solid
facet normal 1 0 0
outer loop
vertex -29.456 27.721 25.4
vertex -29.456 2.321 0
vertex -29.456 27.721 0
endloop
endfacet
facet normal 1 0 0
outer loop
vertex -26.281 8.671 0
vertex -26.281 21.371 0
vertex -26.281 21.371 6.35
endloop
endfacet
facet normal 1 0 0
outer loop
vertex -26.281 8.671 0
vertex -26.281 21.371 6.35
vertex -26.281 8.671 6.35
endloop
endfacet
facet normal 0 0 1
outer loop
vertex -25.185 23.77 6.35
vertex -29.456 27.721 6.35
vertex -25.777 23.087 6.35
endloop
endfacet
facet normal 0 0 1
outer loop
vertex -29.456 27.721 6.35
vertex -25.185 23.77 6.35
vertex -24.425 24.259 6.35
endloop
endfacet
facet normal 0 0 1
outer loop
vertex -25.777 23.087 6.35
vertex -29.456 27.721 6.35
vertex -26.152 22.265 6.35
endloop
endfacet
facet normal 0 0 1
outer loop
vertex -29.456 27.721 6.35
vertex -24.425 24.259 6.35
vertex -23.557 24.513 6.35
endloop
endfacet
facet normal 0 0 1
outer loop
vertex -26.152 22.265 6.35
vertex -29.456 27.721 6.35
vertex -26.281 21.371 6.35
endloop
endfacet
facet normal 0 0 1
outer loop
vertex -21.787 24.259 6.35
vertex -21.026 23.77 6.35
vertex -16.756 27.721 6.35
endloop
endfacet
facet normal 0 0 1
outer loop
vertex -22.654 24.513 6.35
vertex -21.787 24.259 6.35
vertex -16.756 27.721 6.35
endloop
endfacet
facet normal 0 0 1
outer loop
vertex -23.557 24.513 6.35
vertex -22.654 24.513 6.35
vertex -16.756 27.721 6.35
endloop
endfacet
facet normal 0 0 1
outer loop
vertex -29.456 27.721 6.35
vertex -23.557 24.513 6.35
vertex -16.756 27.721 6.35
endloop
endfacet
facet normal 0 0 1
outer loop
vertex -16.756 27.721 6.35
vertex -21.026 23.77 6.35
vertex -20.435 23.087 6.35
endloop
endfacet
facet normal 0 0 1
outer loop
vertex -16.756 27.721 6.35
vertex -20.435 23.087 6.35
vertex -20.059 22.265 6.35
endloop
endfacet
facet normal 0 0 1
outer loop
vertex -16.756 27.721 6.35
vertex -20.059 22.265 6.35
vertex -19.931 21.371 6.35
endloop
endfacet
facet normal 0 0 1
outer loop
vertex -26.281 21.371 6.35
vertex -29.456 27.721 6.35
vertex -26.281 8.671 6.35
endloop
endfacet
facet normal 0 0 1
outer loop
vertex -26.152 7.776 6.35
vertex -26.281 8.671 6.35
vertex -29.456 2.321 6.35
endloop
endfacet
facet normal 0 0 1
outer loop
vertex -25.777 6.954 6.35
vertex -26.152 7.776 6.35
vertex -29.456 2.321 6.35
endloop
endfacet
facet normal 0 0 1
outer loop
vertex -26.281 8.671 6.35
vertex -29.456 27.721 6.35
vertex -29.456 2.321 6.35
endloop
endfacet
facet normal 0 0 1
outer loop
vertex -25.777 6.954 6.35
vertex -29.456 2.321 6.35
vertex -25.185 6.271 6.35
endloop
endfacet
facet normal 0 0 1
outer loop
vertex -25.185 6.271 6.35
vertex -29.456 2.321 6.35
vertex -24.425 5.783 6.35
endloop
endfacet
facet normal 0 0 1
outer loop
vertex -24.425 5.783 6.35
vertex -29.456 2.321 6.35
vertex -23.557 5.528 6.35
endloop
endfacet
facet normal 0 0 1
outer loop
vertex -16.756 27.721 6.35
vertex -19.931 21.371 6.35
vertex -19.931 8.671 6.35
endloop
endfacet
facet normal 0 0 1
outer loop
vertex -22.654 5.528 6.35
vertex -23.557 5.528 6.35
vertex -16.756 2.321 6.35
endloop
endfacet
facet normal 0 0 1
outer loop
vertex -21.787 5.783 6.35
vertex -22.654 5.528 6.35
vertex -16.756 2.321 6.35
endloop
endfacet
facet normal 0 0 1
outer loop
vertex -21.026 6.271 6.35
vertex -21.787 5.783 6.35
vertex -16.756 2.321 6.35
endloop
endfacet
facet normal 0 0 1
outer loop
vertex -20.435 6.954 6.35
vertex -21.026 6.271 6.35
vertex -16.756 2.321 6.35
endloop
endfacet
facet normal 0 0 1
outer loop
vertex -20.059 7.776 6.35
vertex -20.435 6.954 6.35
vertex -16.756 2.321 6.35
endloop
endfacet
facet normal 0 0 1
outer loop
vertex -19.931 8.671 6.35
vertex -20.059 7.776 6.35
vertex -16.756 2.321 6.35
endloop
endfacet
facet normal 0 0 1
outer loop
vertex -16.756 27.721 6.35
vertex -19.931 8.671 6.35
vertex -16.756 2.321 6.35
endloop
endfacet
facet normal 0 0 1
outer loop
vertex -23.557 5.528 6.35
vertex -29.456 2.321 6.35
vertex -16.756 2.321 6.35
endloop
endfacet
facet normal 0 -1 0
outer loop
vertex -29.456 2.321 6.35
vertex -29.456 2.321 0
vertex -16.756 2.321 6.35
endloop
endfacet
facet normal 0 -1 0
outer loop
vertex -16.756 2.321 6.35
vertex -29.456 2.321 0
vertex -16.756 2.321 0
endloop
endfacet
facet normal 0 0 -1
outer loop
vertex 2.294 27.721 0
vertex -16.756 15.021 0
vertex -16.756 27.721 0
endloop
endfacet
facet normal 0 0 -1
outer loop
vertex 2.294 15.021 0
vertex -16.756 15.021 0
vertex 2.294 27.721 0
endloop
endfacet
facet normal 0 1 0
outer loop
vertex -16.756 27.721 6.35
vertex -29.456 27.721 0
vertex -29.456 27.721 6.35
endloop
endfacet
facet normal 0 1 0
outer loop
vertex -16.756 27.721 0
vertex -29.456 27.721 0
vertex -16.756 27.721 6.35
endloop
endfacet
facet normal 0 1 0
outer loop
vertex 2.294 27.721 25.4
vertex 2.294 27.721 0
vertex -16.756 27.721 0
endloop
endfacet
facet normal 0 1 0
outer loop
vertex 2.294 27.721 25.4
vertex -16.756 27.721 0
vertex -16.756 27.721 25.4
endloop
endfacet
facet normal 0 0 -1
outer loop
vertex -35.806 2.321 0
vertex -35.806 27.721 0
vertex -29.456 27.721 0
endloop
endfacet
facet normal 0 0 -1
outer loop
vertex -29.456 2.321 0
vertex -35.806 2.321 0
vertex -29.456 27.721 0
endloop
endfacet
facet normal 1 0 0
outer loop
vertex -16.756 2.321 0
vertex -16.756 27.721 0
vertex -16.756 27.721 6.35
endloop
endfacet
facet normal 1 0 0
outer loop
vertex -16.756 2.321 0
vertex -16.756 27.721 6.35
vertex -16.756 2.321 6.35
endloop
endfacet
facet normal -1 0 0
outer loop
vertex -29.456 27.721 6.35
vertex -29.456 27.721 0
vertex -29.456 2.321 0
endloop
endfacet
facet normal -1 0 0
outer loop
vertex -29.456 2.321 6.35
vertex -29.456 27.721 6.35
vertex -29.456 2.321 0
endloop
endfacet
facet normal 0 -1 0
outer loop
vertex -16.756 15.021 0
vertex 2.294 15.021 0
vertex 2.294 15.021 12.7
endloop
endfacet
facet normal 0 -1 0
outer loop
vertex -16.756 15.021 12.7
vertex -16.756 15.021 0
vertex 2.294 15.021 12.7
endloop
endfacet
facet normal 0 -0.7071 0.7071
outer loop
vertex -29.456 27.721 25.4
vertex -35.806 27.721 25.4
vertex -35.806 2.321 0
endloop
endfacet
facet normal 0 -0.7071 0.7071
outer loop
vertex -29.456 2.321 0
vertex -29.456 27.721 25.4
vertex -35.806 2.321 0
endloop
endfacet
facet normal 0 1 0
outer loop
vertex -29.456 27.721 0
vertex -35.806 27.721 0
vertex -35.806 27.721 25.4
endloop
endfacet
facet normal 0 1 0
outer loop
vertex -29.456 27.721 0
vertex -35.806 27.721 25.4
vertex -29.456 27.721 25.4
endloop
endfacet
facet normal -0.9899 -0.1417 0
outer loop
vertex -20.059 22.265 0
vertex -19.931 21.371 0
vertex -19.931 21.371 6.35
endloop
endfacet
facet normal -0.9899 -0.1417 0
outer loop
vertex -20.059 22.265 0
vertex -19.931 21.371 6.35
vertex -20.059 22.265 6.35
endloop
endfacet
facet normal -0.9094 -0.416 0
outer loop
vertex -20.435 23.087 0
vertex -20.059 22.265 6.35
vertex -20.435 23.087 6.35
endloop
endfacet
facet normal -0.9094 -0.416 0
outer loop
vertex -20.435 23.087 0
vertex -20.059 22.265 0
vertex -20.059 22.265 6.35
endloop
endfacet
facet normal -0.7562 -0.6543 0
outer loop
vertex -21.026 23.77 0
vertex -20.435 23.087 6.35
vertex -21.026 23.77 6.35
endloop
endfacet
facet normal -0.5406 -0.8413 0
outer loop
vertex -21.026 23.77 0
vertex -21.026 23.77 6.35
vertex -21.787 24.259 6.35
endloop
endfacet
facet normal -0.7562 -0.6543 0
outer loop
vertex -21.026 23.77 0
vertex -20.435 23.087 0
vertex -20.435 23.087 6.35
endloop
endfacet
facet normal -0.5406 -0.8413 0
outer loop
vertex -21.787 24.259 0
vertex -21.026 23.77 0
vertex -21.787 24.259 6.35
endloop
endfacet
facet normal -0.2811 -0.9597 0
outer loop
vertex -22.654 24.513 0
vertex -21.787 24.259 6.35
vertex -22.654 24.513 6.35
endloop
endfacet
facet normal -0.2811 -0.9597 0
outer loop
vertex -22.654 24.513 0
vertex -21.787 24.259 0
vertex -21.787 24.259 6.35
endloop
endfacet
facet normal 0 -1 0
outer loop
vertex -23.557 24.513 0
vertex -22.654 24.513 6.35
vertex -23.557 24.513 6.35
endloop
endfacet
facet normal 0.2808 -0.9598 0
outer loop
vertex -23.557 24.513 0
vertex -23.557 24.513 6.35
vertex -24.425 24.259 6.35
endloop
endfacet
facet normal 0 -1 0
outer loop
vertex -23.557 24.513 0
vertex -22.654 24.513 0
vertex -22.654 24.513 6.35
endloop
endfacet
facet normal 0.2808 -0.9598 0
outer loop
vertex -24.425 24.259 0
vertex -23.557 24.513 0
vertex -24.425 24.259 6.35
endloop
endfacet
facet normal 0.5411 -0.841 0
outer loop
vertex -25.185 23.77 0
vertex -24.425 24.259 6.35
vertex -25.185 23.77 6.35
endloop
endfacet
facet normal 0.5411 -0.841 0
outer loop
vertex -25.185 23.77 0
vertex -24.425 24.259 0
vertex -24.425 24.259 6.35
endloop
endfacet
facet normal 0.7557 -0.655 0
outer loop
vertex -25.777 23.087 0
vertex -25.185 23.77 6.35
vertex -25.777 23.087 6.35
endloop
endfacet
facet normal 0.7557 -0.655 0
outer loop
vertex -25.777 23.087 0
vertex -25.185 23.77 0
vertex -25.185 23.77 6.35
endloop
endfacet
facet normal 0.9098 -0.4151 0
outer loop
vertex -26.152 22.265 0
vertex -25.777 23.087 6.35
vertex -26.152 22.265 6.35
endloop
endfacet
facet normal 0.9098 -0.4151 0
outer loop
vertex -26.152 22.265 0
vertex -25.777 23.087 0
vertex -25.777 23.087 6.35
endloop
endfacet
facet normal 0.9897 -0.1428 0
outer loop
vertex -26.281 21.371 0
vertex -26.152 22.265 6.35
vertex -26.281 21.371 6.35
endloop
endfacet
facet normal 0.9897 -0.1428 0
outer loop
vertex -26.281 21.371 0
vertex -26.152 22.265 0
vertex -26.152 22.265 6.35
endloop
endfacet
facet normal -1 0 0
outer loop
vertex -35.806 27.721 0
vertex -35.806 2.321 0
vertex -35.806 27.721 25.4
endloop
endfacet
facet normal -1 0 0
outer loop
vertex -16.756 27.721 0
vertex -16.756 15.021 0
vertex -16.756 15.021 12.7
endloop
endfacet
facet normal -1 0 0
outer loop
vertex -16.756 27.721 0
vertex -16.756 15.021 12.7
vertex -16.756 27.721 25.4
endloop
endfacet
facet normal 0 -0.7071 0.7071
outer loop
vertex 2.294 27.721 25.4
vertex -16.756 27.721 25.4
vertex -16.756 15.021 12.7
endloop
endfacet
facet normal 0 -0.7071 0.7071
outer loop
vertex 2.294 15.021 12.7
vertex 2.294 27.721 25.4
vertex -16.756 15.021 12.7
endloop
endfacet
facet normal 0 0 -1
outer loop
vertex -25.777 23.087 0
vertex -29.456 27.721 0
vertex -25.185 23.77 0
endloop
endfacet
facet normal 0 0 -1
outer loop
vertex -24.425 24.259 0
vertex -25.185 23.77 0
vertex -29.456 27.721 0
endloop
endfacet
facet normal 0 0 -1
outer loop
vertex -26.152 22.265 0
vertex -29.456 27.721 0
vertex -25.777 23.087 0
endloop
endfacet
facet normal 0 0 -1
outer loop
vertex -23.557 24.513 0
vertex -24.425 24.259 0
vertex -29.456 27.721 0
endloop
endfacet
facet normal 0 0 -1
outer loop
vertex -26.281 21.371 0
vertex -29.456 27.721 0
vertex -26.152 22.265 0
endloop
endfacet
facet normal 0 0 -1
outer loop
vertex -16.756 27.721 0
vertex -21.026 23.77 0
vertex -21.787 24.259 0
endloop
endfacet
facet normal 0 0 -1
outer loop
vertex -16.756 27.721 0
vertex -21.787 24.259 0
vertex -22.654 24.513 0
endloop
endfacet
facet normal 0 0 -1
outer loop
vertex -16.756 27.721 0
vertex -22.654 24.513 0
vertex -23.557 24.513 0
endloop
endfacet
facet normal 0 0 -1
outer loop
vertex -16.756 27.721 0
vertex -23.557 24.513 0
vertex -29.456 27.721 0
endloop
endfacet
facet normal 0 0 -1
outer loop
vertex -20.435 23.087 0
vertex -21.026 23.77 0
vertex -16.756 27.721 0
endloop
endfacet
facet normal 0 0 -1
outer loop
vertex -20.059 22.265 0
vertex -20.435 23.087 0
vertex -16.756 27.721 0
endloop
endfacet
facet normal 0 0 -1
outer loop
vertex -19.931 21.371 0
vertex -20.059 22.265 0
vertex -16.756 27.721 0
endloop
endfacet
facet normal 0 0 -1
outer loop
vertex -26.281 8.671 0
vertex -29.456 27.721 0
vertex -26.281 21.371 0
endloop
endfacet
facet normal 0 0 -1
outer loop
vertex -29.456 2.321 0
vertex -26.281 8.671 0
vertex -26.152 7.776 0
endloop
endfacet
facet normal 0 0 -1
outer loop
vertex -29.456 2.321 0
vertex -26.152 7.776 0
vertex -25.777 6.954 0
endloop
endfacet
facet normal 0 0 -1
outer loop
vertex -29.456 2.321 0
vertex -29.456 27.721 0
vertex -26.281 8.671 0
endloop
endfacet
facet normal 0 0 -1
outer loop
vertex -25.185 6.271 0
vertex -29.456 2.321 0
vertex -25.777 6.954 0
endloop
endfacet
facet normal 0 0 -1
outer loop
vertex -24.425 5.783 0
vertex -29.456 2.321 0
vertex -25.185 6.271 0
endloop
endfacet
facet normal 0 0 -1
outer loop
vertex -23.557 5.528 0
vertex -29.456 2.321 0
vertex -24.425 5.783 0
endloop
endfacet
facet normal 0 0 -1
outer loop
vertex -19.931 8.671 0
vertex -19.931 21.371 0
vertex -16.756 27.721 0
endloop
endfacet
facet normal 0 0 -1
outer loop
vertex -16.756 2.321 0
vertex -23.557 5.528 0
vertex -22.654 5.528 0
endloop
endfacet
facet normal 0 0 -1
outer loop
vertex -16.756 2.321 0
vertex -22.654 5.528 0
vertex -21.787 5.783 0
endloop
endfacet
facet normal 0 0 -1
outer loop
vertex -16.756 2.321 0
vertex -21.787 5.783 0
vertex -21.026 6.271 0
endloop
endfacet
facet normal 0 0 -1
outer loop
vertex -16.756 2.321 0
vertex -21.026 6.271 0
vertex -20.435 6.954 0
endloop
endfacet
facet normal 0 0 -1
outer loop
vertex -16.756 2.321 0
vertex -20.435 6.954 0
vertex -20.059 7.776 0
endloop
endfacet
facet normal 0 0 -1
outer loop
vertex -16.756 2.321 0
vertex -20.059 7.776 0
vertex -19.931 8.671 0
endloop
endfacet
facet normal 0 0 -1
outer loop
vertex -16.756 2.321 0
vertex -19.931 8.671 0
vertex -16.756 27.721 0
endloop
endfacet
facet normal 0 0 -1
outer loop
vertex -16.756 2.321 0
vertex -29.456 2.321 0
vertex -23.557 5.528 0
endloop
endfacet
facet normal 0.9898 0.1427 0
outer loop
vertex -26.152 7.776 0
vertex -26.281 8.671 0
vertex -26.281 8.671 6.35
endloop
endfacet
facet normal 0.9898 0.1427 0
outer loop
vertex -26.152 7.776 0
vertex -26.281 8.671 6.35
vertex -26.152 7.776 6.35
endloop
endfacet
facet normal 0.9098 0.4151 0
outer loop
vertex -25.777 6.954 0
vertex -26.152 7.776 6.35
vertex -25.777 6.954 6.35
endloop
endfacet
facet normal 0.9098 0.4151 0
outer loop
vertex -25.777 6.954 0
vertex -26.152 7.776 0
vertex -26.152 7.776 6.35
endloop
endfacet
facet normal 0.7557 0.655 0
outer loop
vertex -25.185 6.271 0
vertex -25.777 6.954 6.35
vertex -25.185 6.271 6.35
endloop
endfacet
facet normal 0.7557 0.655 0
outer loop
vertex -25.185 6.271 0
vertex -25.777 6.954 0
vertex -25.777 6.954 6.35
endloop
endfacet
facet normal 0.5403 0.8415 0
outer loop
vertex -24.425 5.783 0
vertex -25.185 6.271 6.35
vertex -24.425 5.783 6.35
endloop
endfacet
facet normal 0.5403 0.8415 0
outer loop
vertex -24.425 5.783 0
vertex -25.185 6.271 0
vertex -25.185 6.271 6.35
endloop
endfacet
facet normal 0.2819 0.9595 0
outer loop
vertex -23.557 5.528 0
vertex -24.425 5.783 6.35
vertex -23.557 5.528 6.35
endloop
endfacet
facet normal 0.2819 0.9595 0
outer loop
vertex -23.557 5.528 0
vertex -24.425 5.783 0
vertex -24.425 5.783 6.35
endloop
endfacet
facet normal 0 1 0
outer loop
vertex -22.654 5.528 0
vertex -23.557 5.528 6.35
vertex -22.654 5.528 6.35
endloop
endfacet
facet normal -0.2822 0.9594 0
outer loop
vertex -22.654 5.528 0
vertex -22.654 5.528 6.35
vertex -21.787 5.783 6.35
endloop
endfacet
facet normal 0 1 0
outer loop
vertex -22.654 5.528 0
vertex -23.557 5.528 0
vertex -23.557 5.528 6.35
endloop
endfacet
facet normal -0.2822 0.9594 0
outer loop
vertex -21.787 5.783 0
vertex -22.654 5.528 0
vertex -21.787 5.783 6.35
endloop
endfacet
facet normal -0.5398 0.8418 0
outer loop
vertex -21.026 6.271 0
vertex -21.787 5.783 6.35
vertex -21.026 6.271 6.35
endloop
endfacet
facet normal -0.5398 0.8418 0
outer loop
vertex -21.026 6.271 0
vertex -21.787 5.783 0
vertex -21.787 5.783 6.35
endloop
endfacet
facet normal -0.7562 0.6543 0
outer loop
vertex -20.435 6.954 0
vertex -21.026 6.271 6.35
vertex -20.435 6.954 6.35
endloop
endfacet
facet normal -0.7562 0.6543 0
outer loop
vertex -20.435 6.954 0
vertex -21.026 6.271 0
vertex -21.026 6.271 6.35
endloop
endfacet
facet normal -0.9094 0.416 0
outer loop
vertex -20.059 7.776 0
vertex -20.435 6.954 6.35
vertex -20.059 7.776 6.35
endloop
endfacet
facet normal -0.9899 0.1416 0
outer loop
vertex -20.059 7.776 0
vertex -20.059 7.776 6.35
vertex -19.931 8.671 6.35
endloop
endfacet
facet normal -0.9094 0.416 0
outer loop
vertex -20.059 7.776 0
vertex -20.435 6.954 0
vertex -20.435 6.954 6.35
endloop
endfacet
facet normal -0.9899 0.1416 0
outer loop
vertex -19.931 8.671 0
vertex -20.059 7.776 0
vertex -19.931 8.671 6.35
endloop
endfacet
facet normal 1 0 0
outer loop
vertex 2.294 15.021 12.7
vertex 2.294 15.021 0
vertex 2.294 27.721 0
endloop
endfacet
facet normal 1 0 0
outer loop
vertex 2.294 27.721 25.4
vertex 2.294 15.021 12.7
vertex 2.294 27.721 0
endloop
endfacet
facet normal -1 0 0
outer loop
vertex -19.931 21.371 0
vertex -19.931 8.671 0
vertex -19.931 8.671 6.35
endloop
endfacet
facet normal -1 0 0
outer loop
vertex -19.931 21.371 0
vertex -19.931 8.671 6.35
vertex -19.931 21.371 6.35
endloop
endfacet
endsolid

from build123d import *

# Parameters (mm, degrees)
F0_W      = 6.35
F0_H      = 25.4
F1_DEPTH  = 25.4
F2_W      = 12.7
F2_H      = 25.4
F3_DEPTH  = 6.35
F4_W      = 19.05
F4_H      = 25.4
F5_DEPTH  = 12.7
F6_W      = 12.7
F6_H      = 12.7
F7_DEPTH  = 25.4
F9_DEPTH  = 6.35
F11_DEPTH = 19.05


with BuildPart() as f1:
    # F0 (on Top) → F1 (new body)
    with BuildSketch(Plane.XY):
        with Locations((-32.6305792749, 15.0207322229)):
            Rectangle(F0_W, F0_H)
    extrude(amount=F1_DEPTH)

    # F8 (on face) → F9 (cut)
    with BuildSketch(Plane(origin=(-35.8055792749, 0, 0), x_dir=(0, -1, 0), z_dir=(-1, 0, 0))):
        Polygon((-27.7207322229, 25.4), (-2.3207322229, 0), (-2.3207322229, 25.4), align=None)
    extrude(amount=-F9_DEPTH, mode=Mode.SUBTRACT)


with BuildPart() as f3:
    # F2 (on face) → F3 (new body)
    with BuildSketch(Plane(origin=(0, 0, 0), x_dir=(1, 0, 0), z_dir=(0, 0, -1))):
        with Locations((-23.1055792749, -15.0207322229)):
            Rectangle(F2_W, F2_H)
        with BuildLine():
            Line((-19.9305792749, -8.6707322229), (-19.9305792749, -21.3707322229))
            ThreePointArc((-19.9305792749, -21.3707322229), (-23.1055792749, -24.5457322229), (-26.2805792749, -21.3707322229))
            Line((-26.2805792749, -21.3707322229), (-26.2805792749, -8.6707322229))
            ThreePointArc((-26.2805792749, -8.6707322229), (-23.1055792749, -5.4957322229), (-19.9305792749, -8.6707322229))
        make_face(mode=Mode.SUBTRACT)
    extrude(amount=-F3_DEPTH)


with BuildPart() as f5:
    # F4 (on face) → F5 (new body)
    with BuildSketch(Plane(origin=(0, 0, 0), x_dir=(1, 0, 0), z_dir=(0, 0, -1))):
        with Locations((-7.2305792749, -15.0207322229)):
            Rectangle(F4_W, F4_H)
    extrude(amount=-F5_DEPTH)

    # F6 (on face) → F7 (cut)
    with BuildSketch(Plane.YZ.offset(2.2944207251)):
        with Locations((8.6707322229, 6.35)):
            Rectangle(F6_W, F6_H)
    extrude(amount=-F7_DEPTH, mode=Mode.SUBTRACT)

    # F10 (on face) → F11 (join)
    with BuildSketch(Plane.YZ.offset(2.2944207251)):
        Polygon((27.7207322229, 25.4), (15.0207322229, 12.7), (27.7207322229, 12.7), align=None)
    extrude(amount=-F11_DEPTH)


solid = Compound([f1.part, f3.part, f5.part])
